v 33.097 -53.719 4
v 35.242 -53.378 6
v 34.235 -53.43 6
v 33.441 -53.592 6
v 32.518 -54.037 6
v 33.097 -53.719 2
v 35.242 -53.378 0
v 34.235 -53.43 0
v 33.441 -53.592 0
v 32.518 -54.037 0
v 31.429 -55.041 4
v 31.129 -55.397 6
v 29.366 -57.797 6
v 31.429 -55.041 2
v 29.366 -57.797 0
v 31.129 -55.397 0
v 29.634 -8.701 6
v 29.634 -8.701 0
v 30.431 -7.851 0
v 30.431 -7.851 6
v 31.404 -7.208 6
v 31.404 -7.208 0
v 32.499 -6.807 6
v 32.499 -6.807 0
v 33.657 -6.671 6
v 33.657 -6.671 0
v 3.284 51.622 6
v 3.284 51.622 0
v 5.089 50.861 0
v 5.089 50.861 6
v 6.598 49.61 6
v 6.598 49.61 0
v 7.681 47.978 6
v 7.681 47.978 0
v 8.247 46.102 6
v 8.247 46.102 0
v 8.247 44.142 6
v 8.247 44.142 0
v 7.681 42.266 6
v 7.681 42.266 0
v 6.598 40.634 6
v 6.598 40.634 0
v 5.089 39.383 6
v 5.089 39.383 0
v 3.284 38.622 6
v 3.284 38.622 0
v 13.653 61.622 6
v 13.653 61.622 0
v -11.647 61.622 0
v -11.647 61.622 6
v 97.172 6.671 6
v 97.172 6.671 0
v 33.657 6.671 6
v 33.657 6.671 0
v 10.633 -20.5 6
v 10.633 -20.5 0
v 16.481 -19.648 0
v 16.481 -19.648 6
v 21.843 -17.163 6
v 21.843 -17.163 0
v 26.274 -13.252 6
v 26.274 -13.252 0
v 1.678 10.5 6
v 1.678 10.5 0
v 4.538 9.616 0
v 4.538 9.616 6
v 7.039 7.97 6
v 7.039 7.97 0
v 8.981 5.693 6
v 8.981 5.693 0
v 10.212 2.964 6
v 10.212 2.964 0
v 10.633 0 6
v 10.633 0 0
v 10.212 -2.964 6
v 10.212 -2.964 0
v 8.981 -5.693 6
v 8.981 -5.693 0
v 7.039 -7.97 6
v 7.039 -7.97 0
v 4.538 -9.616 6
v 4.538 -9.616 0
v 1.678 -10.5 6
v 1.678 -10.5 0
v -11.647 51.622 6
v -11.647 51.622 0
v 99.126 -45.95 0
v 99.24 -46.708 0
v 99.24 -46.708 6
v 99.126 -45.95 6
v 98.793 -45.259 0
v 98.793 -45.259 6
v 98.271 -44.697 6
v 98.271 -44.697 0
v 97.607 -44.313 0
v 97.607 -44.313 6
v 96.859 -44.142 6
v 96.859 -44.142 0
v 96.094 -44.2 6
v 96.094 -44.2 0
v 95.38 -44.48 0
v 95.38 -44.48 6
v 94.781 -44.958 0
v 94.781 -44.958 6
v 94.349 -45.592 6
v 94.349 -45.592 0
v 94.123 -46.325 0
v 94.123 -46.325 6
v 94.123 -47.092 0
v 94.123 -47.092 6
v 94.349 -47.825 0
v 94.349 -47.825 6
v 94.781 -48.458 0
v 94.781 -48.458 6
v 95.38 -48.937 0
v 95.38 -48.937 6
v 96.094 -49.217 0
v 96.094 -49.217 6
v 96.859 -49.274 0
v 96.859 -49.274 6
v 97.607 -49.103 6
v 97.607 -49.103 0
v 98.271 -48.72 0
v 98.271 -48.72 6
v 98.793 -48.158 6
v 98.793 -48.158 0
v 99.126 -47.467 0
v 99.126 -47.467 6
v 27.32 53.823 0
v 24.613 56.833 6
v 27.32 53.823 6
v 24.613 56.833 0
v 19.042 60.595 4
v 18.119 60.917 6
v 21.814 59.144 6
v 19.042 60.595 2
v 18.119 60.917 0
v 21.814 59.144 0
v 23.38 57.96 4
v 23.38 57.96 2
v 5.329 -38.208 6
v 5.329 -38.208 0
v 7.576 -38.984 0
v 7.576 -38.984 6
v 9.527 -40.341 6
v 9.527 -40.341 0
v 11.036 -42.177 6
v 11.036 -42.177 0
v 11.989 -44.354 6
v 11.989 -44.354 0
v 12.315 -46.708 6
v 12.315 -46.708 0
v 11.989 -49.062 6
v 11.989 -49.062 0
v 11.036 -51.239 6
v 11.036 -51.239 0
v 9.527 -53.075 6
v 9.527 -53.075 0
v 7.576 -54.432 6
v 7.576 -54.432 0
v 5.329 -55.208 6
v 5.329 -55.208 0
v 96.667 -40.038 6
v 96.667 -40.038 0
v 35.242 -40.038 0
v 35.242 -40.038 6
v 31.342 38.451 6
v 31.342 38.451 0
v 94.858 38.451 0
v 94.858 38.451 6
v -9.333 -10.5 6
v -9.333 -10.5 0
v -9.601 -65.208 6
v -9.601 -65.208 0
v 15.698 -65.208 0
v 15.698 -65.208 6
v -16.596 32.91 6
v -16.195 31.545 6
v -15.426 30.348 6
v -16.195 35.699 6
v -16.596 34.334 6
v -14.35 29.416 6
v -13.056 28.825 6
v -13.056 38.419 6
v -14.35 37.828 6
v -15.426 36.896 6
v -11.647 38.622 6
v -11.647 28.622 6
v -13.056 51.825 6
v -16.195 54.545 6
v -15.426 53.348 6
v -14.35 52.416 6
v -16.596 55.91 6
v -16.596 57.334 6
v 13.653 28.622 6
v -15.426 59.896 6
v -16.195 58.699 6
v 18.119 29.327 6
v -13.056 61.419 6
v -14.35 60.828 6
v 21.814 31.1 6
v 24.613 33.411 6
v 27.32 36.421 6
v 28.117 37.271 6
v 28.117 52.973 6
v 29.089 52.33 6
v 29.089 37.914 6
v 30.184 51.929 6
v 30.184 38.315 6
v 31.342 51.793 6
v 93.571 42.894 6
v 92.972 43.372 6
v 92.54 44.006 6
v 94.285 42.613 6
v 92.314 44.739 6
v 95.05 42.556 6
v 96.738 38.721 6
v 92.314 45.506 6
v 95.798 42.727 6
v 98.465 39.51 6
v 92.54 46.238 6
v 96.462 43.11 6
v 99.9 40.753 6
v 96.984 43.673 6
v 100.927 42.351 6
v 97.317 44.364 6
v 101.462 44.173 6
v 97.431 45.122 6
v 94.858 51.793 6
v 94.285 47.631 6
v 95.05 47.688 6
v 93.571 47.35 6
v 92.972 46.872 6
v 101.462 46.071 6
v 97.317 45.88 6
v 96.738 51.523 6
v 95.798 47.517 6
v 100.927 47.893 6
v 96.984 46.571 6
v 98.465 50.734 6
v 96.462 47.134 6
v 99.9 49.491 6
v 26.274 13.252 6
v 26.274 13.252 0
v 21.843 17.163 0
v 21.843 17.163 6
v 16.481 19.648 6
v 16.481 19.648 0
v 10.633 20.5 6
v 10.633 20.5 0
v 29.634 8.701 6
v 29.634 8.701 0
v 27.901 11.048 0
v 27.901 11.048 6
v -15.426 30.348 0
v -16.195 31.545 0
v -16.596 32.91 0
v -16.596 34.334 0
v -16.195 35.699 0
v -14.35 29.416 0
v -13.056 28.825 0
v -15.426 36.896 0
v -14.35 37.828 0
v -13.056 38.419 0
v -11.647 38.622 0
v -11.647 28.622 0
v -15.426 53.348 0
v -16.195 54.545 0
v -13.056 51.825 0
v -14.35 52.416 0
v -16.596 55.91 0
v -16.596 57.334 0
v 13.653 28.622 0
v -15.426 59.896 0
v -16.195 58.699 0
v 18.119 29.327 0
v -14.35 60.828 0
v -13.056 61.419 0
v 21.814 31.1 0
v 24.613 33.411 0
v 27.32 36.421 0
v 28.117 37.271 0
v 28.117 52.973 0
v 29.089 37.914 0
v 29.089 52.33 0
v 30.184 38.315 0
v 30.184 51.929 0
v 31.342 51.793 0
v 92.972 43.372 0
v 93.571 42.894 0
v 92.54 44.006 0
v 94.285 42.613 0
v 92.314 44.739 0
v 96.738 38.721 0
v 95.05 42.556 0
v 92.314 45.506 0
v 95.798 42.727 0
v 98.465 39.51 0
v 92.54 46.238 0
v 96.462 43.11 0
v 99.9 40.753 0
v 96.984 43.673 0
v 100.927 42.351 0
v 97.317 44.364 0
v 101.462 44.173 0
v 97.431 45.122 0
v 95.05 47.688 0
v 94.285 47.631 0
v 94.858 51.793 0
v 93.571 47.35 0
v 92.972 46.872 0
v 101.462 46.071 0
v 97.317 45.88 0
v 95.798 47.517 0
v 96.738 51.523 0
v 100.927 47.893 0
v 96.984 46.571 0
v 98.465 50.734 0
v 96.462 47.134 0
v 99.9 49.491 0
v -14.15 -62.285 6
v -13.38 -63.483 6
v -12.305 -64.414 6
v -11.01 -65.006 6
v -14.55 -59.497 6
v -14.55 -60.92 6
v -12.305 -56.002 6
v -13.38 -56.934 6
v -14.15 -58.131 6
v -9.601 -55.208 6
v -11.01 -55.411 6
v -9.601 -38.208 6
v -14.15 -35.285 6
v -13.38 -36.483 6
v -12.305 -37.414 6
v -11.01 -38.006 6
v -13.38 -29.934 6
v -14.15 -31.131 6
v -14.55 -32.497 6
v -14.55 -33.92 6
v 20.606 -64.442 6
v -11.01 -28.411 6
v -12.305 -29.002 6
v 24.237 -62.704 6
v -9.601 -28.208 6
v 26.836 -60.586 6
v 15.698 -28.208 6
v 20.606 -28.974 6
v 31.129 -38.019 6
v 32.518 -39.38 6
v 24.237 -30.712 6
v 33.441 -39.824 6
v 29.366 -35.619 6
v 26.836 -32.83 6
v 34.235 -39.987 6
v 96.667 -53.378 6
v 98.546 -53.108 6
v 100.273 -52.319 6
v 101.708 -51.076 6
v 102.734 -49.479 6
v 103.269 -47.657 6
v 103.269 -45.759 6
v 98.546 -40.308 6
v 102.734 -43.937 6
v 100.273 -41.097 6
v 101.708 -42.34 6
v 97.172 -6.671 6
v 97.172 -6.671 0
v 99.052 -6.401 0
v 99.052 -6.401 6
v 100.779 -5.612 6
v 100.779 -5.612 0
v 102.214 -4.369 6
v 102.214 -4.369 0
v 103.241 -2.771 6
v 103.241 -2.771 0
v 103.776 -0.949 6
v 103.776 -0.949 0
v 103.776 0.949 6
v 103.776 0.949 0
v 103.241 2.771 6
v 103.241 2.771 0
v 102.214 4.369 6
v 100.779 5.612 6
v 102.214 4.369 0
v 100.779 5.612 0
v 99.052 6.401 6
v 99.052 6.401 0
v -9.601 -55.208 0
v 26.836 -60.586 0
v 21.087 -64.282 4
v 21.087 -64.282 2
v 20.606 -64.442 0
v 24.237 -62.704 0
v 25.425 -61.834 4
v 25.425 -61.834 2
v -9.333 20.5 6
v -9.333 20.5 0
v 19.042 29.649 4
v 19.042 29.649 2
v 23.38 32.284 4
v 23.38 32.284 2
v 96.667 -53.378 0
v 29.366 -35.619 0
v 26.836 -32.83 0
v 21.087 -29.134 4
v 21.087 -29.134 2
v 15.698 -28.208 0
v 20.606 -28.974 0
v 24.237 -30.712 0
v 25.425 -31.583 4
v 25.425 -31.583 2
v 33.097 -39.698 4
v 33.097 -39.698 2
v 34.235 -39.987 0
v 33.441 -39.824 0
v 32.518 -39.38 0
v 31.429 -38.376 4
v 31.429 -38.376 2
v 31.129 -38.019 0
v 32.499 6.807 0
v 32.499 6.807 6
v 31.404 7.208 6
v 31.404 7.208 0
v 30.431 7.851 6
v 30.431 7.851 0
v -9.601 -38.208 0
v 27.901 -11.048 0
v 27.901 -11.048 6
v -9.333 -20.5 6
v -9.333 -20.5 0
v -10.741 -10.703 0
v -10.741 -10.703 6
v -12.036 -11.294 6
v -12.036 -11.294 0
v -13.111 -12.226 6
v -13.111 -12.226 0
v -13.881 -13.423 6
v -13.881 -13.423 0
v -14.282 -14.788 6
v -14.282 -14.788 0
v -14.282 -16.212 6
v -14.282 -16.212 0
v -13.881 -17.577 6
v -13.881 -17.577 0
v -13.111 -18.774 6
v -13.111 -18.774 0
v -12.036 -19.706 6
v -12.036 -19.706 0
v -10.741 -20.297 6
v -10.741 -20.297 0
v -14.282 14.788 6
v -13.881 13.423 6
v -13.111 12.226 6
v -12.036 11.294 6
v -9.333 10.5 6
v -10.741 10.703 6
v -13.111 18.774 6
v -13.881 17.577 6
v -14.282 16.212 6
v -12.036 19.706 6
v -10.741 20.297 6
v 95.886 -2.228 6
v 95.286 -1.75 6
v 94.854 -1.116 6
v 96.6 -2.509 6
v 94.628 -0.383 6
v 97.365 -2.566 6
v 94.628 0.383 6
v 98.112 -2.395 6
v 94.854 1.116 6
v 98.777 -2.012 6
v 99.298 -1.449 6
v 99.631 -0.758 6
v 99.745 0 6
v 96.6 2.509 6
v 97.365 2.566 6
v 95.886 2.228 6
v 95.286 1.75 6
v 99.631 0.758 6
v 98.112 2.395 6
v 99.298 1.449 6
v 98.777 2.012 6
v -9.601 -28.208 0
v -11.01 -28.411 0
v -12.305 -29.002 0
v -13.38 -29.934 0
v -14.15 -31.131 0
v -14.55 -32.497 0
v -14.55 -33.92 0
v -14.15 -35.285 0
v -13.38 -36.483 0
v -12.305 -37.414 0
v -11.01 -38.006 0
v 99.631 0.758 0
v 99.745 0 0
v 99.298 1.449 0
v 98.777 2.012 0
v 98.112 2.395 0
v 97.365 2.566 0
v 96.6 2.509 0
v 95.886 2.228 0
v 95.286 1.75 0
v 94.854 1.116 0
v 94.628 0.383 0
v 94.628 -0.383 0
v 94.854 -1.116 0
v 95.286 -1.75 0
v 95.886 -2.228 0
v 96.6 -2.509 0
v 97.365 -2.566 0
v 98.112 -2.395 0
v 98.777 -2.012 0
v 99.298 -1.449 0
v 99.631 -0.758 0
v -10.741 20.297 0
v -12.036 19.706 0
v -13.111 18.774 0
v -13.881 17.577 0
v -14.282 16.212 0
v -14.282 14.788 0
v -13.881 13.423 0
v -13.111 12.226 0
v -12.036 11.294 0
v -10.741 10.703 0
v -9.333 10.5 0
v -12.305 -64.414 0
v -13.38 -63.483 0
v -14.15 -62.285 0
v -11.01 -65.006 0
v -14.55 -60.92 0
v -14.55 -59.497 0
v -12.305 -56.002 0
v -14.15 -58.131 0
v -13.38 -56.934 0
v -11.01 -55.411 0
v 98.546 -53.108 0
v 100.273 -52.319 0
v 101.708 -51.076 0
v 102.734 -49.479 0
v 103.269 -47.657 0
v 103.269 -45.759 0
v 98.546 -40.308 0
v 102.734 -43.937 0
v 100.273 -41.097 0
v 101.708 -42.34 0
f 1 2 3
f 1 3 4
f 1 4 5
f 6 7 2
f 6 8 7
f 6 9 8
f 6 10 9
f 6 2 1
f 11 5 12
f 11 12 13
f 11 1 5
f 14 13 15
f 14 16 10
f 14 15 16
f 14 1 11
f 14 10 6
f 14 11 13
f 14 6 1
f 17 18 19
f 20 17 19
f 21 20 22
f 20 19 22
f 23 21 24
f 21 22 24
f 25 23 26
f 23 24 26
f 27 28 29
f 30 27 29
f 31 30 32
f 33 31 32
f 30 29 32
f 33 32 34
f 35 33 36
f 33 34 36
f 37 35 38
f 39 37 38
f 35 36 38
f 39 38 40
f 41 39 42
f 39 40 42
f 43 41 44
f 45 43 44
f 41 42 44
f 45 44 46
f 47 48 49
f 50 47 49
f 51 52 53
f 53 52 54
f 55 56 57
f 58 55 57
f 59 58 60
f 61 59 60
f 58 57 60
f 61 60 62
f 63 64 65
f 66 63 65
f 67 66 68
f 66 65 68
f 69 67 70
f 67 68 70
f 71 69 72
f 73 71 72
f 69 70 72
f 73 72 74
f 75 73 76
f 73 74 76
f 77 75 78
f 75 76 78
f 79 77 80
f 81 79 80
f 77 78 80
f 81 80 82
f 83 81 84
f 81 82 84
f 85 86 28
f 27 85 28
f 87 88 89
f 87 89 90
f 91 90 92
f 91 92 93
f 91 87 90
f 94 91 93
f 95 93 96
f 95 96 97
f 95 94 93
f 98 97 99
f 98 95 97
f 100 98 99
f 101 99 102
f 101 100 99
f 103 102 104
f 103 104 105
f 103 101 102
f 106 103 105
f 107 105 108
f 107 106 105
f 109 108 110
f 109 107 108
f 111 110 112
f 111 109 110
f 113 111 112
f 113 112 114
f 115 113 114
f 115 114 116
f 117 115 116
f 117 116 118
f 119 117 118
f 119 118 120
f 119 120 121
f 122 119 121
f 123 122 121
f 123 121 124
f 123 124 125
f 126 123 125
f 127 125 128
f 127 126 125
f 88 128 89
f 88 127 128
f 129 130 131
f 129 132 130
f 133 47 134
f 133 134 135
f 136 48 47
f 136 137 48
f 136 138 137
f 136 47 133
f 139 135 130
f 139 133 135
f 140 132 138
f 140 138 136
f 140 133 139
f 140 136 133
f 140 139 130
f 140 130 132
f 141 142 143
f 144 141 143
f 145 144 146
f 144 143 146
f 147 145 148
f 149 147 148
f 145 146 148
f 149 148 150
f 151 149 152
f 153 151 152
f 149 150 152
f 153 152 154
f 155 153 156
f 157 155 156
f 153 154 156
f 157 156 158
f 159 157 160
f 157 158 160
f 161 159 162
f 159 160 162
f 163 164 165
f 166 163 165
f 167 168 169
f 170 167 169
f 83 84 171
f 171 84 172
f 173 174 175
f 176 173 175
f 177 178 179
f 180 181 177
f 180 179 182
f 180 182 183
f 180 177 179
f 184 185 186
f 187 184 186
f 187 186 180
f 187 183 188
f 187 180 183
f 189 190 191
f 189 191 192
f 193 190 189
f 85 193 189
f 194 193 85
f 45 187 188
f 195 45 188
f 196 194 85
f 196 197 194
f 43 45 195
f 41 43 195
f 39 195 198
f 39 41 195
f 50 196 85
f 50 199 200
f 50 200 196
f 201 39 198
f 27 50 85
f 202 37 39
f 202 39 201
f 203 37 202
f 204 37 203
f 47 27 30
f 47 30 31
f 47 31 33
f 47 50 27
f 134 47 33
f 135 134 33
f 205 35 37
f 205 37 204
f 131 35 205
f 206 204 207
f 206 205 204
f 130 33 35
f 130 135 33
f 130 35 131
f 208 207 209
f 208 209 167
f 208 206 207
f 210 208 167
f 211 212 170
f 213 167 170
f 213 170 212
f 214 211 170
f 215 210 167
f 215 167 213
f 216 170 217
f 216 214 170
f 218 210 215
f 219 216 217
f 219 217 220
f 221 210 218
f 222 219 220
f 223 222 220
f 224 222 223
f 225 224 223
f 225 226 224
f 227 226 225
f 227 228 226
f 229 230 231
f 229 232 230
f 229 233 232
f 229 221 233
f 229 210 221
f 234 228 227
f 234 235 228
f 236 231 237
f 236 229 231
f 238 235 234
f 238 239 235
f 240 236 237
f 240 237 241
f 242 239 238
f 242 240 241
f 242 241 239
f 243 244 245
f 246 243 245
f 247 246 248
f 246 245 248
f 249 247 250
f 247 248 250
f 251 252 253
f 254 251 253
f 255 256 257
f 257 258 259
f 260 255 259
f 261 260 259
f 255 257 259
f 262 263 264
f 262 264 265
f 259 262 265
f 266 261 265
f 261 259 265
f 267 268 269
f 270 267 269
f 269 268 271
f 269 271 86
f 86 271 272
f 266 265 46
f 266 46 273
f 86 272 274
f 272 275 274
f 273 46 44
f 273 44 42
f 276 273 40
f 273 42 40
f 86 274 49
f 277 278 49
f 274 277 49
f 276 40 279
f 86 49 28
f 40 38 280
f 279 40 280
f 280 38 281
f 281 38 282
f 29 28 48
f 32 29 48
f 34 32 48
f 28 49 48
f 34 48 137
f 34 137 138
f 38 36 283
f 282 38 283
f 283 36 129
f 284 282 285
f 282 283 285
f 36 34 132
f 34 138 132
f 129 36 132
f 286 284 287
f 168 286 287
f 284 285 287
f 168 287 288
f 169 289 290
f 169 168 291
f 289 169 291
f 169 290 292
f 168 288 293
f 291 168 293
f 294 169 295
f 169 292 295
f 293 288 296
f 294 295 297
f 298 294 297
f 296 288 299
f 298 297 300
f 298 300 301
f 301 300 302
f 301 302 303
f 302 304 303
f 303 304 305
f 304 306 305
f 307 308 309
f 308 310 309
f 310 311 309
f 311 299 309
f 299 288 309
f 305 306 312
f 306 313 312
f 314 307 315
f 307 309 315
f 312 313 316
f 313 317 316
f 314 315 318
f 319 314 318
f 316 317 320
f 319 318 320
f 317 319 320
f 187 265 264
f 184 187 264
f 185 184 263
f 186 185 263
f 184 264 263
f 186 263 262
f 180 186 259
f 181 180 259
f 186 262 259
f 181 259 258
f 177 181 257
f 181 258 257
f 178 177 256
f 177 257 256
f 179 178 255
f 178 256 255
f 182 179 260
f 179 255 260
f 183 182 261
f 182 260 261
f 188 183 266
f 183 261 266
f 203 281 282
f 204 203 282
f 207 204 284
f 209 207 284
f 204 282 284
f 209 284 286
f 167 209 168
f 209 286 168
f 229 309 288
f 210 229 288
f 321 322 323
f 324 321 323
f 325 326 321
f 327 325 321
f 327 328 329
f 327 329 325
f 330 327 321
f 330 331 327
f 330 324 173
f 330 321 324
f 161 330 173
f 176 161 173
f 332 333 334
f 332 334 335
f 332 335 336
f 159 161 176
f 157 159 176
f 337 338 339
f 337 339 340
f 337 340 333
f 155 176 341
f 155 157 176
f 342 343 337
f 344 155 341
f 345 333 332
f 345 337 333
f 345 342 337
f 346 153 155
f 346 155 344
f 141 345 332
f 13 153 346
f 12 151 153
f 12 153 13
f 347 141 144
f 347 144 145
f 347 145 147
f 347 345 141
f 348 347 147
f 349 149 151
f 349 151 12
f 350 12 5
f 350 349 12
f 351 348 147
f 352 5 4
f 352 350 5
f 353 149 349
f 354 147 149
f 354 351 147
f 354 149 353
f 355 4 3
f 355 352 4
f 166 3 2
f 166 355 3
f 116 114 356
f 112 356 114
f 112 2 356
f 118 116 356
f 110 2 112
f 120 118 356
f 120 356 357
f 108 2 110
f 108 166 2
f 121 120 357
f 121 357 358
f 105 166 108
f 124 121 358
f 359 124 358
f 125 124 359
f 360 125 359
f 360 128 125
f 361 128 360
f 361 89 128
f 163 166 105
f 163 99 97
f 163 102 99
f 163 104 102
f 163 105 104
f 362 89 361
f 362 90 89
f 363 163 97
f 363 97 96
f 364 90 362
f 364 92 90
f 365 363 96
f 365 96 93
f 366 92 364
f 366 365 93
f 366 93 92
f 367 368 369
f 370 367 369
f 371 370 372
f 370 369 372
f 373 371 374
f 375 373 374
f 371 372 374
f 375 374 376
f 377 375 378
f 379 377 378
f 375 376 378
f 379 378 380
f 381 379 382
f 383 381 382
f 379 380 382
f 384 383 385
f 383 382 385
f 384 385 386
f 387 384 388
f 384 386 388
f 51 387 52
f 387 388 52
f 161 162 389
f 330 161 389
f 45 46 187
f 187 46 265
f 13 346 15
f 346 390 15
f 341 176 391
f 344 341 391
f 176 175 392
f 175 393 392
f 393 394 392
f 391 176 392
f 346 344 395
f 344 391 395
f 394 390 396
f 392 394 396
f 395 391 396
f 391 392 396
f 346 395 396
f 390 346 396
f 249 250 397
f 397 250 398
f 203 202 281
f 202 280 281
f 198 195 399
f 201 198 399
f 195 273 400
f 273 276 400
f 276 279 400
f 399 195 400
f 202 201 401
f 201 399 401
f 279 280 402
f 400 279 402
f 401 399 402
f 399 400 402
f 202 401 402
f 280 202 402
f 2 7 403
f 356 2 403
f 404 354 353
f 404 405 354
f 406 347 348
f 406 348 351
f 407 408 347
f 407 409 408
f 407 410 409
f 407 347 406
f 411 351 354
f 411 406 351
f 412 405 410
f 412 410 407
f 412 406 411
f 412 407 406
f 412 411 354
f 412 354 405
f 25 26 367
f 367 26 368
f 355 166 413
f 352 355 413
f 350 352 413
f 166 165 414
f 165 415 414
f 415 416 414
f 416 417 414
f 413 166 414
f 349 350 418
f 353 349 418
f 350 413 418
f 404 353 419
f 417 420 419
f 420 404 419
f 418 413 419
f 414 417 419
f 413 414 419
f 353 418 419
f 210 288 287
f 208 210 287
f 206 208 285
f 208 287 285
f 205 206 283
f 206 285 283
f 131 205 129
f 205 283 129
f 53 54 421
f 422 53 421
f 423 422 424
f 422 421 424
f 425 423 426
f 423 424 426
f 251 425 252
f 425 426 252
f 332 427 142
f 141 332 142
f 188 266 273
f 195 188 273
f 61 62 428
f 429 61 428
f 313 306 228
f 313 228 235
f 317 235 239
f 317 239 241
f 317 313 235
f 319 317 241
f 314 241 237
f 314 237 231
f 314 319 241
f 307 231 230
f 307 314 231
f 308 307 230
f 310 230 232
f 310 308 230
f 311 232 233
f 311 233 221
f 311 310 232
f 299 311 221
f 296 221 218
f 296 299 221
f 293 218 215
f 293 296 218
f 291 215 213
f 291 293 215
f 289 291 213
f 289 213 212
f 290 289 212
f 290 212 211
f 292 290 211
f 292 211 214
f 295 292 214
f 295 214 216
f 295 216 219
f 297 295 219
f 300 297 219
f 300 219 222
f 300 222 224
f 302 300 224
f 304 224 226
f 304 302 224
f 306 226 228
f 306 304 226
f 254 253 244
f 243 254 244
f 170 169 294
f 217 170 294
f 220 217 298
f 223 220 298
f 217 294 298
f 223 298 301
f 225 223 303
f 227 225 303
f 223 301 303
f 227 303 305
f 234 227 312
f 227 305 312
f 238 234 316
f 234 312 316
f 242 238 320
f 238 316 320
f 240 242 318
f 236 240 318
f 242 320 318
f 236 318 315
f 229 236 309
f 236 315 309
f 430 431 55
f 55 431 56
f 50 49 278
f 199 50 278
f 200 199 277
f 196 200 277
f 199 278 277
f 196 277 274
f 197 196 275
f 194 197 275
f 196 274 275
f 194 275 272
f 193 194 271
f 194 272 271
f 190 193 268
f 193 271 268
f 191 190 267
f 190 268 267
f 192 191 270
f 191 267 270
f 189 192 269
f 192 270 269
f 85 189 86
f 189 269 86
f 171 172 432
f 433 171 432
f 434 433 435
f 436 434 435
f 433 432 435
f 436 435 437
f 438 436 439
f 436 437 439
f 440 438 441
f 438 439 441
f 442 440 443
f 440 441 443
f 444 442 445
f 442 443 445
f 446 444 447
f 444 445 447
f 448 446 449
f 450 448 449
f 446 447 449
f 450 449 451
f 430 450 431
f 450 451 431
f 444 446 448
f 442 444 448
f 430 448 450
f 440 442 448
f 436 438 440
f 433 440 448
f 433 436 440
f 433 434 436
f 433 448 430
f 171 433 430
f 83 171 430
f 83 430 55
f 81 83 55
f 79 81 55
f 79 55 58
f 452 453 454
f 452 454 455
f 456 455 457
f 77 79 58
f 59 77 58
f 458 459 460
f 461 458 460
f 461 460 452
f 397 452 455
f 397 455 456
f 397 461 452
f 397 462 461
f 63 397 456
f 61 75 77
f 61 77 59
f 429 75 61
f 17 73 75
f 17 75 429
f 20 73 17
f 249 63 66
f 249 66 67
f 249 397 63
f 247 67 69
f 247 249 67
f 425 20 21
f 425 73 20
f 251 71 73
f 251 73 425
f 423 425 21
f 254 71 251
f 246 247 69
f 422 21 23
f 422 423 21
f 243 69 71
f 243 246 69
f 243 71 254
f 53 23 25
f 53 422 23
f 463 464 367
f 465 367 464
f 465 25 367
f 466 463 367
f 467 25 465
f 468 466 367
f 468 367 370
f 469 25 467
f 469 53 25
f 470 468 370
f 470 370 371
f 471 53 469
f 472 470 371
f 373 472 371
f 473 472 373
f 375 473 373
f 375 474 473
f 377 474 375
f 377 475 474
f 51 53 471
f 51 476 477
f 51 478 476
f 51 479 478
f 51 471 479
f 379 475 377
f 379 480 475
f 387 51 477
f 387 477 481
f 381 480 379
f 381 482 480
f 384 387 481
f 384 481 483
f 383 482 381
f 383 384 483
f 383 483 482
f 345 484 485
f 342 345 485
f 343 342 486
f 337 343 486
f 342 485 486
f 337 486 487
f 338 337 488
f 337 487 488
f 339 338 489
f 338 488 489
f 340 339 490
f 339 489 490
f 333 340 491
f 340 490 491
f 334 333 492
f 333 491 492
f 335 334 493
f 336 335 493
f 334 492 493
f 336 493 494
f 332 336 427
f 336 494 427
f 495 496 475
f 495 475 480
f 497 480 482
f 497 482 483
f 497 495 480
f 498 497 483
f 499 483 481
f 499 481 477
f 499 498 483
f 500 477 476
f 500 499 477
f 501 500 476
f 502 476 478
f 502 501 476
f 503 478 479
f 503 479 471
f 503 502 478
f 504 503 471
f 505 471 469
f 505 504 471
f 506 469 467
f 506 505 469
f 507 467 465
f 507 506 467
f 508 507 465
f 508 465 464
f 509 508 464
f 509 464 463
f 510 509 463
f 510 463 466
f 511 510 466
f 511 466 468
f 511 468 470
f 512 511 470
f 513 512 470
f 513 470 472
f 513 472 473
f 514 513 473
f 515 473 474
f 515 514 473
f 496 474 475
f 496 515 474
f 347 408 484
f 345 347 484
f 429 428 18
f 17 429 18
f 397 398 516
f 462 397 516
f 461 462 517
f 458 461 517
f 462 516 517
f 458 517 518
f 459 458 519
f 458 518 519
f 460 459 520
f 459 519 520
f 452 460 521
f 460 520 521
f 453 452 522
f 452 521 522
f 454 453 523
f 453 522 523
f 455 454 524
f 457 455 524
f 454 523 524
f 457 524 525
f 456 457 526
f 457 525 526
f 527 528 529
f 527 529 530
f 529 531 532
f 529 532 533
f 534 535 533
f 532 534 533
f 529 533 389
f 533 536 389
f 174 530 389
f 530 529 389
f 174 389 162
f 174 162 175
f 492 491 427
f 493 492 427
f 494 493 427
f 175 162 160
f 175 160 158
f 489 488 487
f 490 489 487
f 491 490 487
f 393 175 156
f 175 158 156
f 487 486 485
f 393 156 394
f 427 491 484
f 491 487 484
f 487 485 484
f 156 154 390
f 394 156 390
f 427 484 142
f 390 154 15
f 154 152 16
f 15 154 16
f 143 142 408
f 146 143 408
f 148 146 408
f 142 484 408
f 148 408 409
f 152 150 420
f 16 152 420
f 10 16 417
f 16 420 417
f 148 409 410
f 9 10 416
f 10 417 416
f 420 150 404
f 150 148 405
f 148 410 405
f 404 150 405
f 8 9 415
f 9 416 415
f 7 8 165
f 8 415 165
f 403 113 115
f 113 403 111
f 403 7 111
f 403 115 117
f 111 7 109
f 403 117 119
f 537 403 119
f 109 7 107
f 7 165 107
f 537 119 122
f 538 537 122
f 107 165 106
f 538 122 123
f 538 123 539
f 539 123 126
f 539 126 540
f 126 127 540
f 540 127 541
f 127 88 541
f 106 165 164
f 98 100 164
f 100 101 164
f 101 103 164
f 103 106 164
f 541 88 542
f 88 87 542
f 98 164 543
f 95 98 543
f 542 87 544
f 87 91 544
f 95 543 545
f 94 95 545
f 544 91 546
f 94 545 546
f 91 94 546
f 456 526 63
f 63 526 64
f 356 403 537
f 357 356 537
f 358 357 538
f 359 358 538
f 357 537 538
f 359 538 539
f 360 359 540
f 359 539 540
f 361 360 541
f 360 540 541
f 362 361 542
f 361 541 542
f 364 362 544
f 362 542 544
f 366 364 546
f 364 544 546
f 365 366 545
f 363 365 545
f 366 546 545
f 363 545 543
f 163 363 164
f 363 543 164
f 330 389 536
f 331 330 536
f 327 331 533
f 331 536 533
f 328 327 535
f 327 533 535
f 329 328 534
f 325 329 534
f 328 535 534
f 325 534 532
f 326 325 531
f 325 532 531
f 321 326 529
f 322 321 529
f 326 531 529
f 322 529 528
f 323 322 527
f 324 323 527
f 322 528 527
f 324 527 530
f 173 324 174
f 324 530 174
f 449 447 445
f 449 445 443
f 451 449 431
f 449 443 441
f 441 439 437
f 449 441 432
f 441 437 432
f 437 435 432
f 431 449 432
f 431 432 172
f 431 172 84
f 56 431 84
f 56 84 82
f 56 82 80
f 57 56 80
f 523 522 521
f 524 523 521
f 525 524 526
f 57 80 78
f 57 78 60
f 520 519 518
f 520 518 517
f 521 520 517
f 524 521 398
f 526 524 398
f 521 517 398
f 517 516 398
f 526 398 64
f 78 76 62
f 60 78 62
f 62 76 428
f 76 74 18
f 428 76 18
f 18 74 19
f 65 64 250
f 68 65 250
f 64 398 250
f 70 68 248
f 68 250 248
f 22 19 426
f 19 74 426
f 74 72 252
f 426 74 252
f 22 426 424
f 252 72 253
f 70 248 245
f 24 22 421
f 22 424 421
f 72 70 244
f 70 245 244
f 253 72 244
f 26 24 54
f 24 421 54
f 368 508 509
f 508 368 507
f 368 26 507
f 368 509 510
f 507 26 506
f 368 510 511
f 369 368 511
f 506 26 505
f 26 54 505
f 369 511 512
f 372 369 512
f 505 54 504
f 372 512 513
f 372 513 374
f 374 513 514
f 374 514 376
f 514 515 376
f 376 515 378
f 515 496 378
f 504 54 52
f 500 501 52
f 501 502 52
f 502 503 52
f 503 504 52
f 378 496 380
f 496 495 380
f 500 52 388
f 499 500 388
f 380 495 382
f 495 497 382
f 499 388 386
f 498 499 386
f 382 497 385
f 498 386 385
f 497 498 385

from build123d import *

# Parameters (mm, degrees)
F0_R     = 2.573066
F1_DEPTH = 6
F2_R     = 2.573066
F3_DEPTH = 6
F4_R     = 2.573066
F5_DEPTH = 6


with BuildPart() as f1:
    # F0 (on Top) → F1 (new body)
    with BuildSketch(Plane.XY):
        with BuildLine():
            ThreePointArc((1.678139, 10.5), (10.633257, 0), (1.678139, -10.5))
            Line((1.678139, -10.5), (-4.690416, -10.5))
            Line((-4.690416, -10.5), (-9.332535, -10.5))
            ThreePointArc((-9.332535, -10.5), (-14.332535, -15.5), (-9.332535, -20.5))
            Line((-9.332535, -20.5), (10.633257, -20.5))
            ThreePointArc((10.633257, -20.5), (19.252415, -18.600003), (26.273878, -13.252207))
            Line((26.273878, -13.252207), (27.901342, -11.048223))
            Line((27.901342, -11.048223), (29.634343, -8.701317))
            ThreePointArc((29.634343, -8.701317), (31.403873, -7.20765), (33.65659, -6.671423))
            Line((33.65659, -6.671423), (97.172417, -6.671423))
            ThreePointArc((97.172417, -6.671423), (103.843839, 0), (97.172417, 6.671423))
            Line((97.172417, 6.671423), (33.65659, 6.671423))
            ThreePointArc((33.65659, 6.671423), (31.403873, 7.20765), (29.634343, 8.701317))
            Line((29.634343, 8.701317), (27.901342, 11.048223))
            Line((27.901342, 11.048223), (26.273878, 13.252207))
            ThreePointArc((26.273878, 13.252207), (19.252415, 18.600003), (10.633257, 20.5))
            Line((10.633257, 20.5), (-9.332535, 20.5))
            ThreePointArc((-9.332535, 20.5), (-14.332535, 15.5), (-9.332535, 10.5))
            Line((-9.332535, 10.5), (-4.690416, 10.5))
            Line((-4.690416, 10.5), (1.678139, 10.5))
        make_face()
        with Locations((97.172417, 0)):
            Circle(F0_R, mode=Mode.SUBTRACT)
    extrude(amount=F1_DEPTH)


with BuildPart() as f3:
    # F2 (on Top) → F3 (new body)
    with BuildSketch(Plane.XY):
        with BuildLine():
            ThreePointArc((3.283854, 51.622033), (8.318847, 45.122033), (3.283854, 38.622033))
            Line((3.283854, 38.622033), (-3.084701, 38.622033))
            Line((-3.084701, 38.622033), (-11.646944, 38.622033))
            ThreePointArc((-11.646944, 38.622033), (-16.646944, 33.622033), (-11.646944, 28.622033))
            Line((-11.646944, 28.622033), (13.652892, 28.622033))
            add(Edge.make_bspline(
                [(13.652892, 28.622033), (19.784534, 28.809249), (23.361327, 31.568489), (27.319934, 36.420716)],
                knots=[0, 0, 0, 0, 15.735549, 15.735549, 15.735549, 15.735549], degree=3))
            ThreePointArc((27.319934, 36.420716), (29.089464, 37.914382), (31.342181, 38.45061))
            Line((31.342181, 38.45061), (94.858007, 38.45061))
            ThreePointArc((94.858007, 38.45061), (101.52943, 45.122033), (94.858007, 51.793455))
            Line((94.858007, 51.793455), (31.342181, 51.793455))
            ThreePointArc((31.342181, 51.793455), (29.089464, 52.329683), (27.319934, 53.82335))
            add(Edge.make_bspline(
                [(13.652892, 61.622033), (19.784534, 61.434817), (23.361327, 58.675576), (27.319934, 53.82335)],
                knots=[0, 0, 0, 0, 15.735549, 15.735549, 15.735549, 15.735549], degree=3))
            Line((13.652892, 61.622033), (-11.646944, 61.622033))
            ThreePointArc((-11.646944, 61.622033), (-16.646944, 56.622033), (-11.646944, 51.622033))
            Line((-11.646944, 51.622033), (-3.084701, 51.622033))
            Line((-3.084701, 51.622033), (3.283854, 51.622033))
        make_face()
        with Locations((94.858007, 45.122033)):
            Circle(F2_R, mode=Mode.SUBTRACT)
    extrude(amount=F3_DEPTH)


with BuildPart() as f5:
    # F4 (on Top) → F5 (new body)
    with BuildSketch(Plane.XY):
        with BuildLine():
            ThreePointArc((5.329421, -38.208221), (12.315355, -46.708221), (5.329421, -55.208221))
            Line((5.329421, -55.208221), (-1.039134, -55.208221))
            Line((-1.039134, -55.208221), (-9.601377, -55.208221))
            ThreePointArc((-9.601377, -55.208221), (-14.601377, -60.208221), (-9.601377, -65.208221))
            Line((-9.601377, -65.208221), (15.698459, -65.208221))
            add(Edge.make_bspline(
                [(15.698459, -65.208221), (21.830102, -65.021005), (25.406895, -62.649587), (29.365501, -57.79736)],
                knots=[0, 0, 0, 0, 15.54699, 15.54699, 15.54699, 15.54699], degree=3))
            add(Edge.make_bspline(
                [(35.24185, -53.378221), (32.568149, -53.378221), (31.917792, -54.173104), (29.365501, -57.79736)],
                knots=[0, 0, 0, 0, 7.352569, 7.352569, 7.352569, 7.352569], degree=3))
            Line((35.24185, -53.378221), (96.666954, -53.378221))
            ThreePointArc((96.666954, -53.378221), (103.336954, -46.708221), (96.666954, -40.038221))
            Line((96.666954, -40.038221), (35.24185, -40.038221))
            add(Edge.make_bspline(
                [(35.24185, -40.038221), (32.568149, -40.038221), (31.917792, -39.243337), (29.365501, -35.619081)],
                knots=[0, 0, 0, 0, 7.352569, 7.352569, 7.352569, 7.352569], degree=3))
            add(Edge.make_bspline(
                [(15.698459, -28.208221), (21.830102, -28.395437), (25.406895, -30.766854), (29.365501, -35.619081)],
                knots=[0, 0, 0, 0, 15.54699, 15.54699, 15.54699, 15.54699], degree=3))
            Line((15.698459, -28.208221), (-9.601377, -28.208221))
            ThreePointArc((-9.601377, -28.208221), (-14.601377, -33.208221), (-9.601377, -38.208221))
            Line((-9.601377, -38.208221), (-1.039134, -38.208221))
            Line((-1.039134, -38.208221), (5.329421, -38.208221))
        make_face()
        with Locations((96.666954, -46.708221)):
            Circle(F4_R, mode=Mode.SUBTRACT)
    extrude(amount=F5_DEPTH)


solid = Compound([f1.part, f3.part, f5.part])
